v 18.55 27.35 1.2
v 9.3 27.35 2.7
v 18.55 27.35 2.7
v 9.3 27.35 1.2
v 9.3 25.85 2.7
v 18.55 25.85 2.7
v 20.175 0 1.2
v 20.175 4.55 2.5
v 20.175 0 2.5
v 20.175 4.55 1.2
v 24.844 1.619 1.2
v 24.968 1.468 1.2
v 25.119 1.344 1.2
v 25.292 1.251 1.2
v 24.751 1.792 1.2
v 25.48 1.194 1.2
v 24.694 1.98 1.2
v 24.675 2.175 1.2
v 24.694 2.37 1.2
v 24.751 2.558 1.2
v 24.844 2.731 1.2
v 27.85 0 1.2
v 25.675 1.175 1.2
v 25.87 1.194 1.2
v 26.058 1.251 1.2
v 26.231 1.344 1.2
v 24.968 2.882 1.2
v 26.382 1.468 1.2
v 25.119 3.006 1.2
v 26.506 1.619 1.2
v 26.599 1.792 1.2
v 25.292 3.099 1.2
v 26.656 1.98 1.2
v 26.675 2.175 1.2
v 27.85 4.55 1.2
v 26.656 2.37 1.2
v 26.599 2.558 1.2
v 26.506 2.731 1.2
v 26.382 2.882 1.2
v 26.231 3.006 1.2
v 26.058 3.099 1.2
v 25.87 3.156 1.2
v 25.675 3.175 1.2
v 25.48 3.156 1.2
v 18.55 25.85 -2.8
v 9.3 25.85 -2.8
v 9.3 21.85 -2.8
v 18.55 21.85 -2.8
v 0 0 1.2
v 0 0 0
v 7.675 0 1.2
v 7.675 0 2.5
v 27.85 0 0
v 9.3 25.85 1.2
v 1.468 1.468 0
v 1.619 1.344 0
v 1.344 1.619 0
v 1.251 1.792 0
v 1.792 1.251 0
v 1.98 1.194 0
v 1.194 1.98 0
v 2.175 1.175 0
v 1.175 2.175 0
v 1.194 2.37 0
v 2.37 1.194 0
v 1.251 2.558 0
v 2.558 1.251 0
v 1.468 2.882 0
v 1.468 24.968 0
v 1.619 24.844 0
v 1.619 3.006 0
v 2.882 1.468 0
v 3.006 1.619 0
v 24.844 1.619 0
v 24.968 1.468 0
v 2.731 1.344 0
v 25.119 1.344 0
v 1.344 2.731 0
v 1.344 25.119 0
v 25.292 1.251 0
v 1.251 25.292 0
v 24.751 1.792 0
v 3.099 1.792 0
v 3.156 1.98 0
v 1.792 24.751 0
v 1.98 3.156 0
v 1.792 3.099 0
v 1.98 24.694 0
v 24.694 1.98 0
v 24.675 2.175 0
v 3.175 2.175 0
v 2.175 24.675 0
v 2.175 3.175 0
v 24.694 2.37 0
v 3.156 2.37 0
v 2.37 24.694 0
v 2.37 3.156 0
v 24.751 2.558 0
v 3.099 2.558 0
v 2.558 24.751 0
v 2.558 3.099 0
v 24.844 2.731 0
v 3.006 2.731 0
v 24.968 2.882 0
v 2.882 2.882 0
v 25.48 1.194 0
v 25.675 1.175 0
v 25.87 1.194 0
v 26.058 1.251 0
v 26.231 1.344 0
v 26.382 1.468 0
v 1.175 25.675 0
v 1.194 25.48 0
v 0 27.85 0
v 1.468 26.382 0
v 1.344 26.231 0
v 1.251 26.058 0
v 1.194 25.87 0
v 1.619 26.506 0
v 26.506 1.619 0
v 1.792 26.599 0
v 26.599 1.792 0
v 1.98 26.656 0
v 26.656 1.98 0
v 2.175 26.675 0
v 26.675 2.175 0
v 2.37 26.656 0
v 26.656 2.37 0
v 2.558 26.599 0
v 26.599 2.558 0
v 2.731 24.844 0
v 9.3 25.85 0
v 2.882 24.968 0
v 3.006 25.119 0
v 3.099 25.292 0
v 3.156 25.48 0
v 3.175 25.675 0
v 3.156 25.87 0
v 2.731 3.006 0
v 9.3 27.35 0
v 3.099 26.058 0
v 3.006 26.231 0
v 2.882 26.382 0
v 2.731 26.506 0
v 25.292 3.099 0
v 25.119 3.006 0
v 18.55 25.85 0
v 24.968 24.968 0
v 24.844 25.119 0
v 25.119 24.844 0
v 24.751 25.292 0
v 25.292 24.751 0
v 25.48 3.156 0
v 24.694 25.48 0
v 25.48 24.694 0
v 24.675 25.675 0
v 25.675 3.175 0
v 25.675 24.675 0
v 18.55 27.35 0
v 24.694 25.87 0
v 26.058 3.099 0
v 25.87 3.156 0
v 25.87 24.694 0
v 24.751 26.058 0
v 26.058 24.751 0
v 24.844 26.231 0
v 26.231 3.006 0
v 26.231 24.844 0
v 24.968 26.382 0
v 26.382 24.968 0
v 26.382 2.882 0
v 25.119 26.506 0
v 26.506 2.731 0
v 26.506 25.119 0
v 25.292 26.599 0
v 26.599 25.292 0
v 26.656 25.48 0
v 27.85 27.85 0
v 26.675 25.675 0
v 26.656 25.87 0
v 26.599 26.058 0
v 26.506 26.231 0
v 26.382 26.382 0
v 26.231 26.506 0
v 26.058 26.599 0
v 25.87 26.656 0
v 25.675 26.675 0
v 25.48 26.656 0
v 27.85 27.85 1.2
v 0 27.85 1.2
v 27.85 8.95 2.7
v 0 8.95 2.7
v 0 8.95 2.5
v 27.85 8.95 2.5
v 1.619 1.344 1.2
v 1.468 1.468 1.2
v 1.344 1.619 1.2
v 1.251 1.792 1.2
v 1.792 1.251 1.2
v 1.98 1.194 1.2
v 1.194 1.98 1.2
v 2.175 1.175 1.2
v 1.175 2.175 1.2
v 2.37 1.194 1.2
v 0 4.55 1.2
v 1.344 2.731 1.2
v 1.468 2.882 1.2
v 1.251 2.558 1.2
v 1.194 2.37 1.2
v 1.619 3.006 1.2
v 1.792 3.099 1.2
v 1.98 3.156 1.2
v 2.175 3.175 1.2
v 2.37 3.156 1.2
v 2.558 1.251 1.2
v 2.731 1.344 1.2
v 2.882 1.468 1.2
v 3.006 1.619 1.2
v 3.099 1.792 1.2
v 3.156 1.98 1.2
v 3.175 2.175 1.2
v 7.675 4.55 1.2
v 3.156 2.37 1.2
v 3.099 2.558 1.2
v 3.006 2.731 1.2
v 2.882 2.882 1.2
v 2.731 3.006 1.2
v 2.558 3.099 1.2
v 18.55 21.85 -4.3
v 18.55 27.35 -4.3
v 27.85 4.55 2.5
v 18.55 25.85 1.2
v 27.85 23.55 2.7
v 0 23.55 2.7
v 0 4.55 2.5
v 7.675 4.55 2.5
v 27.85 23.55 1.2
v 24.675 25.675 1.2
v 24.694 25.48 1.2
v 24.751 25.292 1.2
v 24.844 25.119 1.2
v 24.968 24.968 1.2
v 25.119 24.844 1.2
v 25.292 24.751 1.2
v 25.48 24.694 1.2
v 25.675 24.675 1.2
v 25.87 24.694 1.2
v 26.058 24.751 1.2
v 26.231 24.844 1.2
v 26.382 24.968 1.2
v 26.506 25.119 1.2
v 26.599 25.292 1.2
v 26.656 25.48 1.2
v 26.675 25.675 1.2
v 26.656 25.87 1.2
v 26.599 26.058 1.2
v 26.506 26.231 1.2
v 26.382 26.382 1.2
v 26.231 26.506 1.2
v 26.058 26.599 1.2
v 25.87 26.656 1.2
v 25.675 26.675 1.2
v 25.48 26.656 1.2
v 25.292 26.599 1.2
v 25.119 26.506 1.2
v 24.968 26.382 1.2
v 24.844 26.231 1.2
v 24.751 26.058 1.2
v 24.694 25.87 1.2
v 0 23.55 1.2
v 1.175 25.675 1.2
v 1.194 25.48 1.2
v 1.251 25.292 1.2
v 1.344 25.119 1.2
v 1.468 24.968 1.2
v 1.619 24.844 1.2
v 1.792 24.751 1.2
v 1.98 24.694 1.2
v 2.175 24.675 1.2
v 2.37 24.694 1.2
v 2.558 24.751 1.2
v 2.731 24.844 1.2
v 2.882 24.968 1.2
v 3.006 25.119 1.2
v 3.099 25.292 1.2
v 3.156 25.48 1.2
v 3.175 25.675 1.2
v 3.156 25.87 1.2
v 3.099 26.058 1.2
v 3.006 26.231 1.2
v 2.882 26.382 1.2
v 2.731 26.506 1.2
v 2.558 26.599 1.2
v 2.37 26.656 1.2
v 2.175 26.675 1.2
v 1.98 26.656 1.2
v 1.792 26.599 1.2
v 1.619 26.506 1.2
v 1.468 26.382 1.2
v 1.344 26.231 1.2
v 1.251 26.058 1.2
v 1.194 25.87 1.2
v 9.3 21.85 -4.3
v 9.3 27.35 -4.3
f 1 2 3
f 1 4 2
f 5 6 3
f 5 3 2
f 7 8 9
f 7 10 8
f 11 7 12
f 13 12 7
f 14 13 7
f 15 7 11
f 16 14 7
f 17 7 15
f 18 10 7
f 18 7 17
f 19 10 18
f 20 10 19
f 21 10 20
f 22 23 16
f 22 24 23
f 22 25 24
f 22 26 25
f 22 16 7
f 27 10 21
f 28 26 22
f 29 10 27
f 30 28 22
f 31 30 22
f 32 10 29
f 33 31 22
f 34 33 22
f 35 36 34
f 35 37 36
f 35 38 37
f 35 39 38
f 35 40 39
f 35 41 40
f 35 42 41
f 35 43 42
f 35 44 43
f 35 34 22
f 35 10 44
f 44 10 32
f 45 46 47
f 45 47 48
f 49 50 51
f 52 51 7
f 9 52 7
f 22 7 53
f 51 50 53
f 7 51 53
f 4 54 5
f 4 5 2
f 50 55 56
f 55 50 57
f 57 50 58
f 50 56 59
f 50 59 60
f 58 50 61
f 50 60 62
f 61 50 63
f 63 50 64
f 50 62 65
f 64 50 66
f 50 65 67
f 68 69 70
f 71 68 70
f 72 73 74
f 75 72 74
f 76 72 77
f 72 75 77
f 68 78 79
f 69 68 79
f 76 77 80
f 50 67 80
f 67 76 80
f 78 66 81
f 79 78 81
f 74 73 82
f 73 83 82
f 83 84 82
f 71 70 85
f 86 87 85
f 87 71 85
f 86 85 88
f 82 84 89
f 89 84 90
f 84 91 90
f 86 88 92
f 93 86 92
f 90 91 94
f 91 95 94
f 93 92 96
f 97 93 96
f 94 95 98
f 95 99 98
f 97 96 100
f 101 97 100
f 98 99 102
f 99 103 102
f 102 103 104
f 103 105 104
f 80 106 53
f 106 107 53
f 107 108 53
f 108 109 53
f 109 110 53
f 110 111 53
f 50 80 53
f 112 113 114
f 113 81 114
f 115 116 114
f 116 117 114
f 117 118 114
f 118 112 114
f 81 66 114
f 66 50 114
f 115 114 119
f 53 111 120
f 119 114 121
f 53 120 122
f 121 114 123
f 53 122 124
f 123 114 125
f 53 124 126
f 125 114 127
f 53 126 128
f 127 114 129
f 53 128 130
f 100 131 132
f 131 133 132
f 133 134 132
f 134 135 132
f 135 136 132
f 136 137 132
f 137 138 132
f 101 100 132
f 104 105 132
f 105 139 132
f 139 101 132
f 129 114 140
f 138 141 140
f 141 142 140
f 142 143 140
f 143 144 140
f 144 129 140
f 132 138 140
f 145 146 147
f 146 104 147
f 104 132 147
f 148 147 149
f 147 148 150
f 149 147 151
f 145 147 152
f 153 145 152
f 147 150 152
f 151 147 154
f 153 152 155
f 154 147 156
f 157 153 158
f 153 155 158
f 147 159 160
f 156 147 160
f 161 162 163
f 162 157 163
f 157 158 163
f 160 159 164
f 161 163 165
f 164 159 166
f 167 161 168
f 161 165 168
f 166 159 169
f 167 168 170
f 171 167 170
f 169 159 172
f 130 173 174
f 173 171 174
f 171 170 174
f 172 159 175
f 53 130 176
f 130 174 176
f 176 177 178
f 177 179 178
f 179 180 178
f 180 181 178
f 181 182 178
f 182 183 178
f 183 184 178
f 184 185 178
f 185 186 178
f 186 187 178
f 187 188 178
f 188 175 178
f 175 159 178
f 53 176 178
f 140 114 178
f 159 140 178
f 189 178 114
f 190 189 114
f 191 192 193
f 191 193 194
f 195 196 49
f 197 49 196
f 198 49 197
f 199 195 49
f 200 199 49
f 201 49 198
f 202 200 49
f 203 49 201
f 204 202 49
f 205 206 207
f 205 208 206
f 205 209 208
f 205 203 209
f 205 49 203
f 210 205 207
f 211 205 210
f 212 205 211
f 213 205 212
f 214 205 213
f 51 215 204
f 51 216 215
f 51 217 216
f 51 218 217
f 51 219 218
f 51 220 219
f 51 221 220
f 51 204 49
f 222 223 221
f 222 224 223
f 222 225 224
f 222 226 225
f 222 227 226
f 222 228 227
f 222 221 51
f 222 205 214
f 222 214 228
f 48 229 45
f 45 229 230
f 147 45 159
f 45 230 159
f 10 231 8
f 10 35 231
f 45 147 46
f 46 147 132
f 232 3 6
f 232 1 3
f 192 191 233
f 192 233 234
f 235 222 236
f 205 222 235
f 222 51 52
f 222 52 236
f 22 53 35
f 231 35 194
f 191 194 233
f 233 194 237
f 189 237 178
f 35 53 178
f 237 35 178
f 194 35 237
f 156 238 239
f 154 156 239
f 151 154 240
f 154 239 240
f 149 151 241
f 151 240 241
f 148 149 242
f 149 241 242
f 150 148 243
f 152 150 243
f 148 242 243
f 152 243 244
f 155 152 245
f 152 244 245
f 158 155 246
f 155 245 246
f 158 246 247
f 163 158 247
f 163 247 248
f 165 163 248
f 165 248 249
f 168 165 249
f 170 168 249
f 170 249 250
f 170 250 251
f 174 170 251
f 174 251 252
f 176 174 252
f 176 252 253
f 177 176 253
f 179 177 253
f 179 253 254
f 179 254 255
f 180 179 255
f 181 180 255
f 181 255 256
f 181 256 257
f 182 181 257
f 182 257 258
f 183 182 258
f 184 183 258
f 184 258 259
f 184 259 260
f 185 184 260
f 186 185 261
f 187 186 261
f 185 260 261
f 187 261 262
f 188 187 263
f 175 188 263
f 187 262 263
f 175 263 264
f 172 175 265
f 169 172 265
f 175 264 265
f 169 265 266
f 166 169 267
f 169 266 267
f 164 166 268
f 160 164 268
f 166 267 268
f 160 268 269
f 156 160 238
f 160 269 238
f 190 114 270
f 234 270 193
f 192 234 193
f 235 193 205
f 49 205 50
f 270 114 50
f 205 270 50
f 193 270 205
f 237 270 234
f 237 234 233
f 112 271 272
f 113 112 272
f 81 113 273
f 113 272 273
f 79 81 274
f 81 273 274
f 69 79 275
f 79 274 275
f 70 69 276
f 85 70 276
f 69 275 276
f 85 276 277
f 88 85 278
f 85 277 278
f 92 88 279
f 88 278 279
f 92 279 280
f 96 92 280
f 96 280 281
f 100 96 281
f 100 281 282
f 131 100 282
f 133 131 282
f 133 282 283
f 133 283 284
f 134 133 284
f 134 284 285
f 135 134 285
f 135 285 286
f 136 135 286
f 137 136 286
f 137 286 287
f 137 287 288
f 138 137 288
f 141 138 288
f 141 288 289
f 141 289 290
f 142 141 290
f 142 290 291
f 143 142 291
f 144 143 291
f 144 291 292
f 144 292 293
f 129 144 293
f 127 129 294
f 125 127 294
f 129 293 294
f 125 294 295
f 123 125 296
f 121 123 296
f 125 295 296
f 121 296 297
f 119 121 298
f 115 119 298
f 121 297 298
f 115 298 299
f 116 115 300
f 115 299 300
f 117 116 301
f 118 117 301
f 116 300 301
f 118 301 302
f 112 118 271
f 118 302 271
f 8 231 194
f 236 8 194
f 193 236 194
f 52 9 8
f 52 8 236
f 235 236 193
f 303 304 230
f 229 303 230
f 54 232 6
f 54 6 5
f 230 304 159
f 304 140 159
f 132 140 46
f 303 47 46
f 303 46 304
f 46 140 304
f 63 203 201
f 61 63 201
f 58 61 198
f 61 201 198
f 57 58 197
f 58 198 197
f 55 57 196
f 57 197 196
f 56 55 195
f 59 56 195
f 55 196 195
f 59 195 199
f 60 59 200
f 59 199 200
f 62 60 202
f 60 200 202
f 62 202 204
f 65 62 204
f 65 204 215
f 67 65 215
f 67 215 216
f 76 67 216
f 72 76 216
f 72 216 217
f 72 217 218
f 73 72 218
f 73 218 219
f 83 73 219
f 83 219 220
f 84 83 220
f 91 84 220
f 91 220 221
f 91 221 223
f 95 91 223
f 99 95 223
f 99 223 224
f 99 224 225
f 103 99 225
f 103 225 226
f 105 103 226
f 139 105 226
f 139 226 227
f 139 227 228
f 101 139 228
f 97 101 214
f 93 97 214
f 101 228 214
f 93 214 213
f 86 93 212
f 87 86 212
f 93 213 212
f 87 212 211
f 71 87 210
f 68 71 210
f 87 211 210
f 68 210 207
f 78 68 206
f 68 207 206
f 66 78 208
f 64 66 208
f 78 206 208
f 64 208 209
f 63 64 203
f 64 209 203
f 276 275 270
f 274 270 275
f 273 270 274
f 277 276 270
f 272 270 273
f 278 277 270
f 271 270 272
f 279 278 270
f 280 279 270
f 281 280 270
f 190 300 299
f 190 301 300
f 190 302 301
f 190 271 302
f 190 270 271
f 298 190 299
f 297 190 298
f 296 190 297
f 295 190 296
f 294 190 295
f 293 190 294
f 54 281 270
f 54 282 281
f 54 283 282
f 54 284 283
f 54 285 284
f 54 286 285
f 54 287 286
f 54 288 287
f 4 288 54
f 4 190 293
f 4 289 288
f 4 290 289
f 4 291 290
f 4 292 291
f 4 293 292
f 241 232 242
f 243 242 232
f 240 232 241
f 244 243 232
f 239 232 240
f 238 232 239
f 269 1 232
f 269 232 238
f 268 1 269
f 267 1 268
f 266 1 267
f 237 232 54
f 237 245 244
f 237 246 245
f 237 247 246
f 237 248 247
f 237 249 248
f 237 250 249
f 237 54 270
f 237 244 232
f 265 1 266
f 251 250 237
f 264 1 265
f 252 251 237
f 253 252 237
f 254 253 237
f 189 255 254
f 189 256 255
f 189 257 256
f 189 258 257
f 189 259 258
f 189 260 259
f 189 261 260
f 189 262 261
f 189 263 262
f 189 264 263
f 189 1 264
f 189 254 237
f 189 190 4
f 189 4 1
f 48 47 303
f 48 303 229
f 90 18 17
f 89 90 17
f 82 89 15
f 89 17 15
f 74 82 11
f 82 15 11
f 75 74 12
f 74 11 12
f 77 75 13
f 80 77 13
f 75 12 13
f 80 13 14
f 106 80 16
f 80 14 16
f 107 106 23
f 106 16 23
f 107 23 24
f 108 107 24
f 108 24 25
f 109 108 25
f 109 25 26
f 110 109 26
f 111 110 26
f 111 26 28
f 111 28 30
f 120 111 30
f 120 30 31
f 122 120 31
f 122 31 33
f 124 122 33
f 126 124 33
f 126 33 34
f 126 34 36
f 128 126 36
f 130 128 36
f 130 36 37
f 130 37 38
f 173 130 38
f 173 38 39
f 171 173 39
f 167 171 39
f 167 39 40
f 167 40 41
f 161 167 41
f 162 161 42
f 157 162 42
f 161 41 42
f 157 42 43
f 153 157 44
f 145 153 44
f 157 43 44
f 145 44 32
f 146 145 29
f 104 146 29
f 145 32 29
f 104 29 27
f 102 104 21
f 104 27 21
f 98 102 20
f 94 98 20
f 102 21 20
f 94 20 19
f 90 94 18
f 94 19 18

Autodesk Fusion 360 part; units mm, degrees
sketch "Sketch1" plane through (0, 0, 0) normal (0, 0, 1) x (1, 0, 0)
  line L0 (0, 0) -> (27.85, 0)
  line L1 (27.85, 0) -> (27.85, 27.85)
  line L2 (27.85, 27.85) -> (0, 27.85)
  line L3 (0, 27.85) -> (0, 0)
  dimension "d1" = 27.85
  dimension "d2" = 27.85
extrude "Extrude1" add sketch "Sketch1" along normal blind 1.2
sketch "Sketch2" plane through (0, 0, 1.2) normal (0, 0, 1) x (-1, 0, 0)
  line L0 (0, -27.85) -> (0, 0)
  line L1 (0, 0) -> (-27.85, 0)
  line L2 (-27.85, 0) -> (-27.85, -27.85)
  line L3 (-27.85, -27.85) -> (0, -27.85)
  circle A0 centre (-2.175, -25.675) radius 1
  circle A1 centre (-2.175, -2.175) radius 1
  circle A2 centre (-25.675, -25.675) radius 1
  circle A3 centre (-25.675, -2.175) radius 1
  line L4 (0, -24.675) -> (-27.85, -24.675) construction
  line L5 (0, -3.175) -> (-27.85, -3.175) construction
  line L6 (-24.675, 0) -> (-24.675, -27.85) construction
  line L7 (-3.175, 0) -> (-3.175, -27.85) construction
  line L8 (-24.675, -13.925) -> (-27.85, -13.925) construction
  line L9 (-3.175, -13.925) -> (0, -13.925) construction
  line L10 (-13.925, -24.675) -> (-13.925, -27.85) construction
  line L11 (-13.925, -3.175) -> (-13.925, 0) construction
  dimension "d5" = 2
  dimension "d6" = 21.5
  dimension "d7" = 21.5
extrude "Extrude2" cut sketch "Sketch2" against normal through all contours A0 | A1 | A2 | A3
sketch "Sketch3" plane through (0, 0, 1.2) normal (0, 0, 1) x (-1, 0, 0)
  circle A0 centre (-25.675, -2.175) radius 1
  circle A1 centre (-25.675, -25.675) radius 1
  circle A2 centre (-2.175, -2.175) radius 1
  circle A3 centre (-2.175, -25.675) radius 1
  line L0 (0, -27.85) -> (0, 0)
  line L1 (0, 0) -> (-27.85, 0)
  line L2 (-27.85, 0) -> (-27.85, -27.85)
  line L3 (-27.85, -27.85) -> (0, -27.85)
  line L4 (0, -23.55) -> (-27.85, -23.55)
  line L5 (-27.85, -23.55) -> (-27.85, -4.55)
  line L6 (-27.85, -4.55) -> (0, -4.55)
  line L7 (0, -4.55) -> (0, -23.55)
  line L8 (-7.675, -4.55) -> (-20.175, -4.55)
  line L9 (-20.175, -4.55) -> (-20.175, 0)
  line L10 (-20.175, 0) -> (-7.675, 0)
  line L11 (-7.675, 0) -> (-7.675, -4.55)
  line L12 (-13.925, 0) -> (-13.925, -4.55) construction
  dimension "d9" = 19
  dimension "d10" = 4.3
  dimension "d13" = 12.5
extrude "Extrude3" add sketch "Sketch3" along normal blind 1.5 contours L0 L2 L4 L5 L6 L7 L8
extrude "Extrude4" add sketch "Sketch3" along normal blind 1.3 contours L1 L6 L8 L9 L10 L11
sketch "Sketch4" plane through (0, 0, 1.2) normal (0, 0, 1) x (-1, 0, 0)
  line L0 (0, -23.55) -> (-27.85, -23.55)
  line L1 (-27.85, -23.55) -> (-27.85, -27.85)
  line L2 (-27.85, -27.85) -> (0, -27.85)
  line L3 (0, -27.85) -> (0, -23.55)
  circle A0 centre (-25.675, -25.675) radius 1
  circle A1 centre (-2.175, -25.675) radius 1
  line L4 (-9.3, -27.35) -> (-18.55, -27.35)
  line L5 (-18.55, -27.35) -> (-18.55, -25.85)
  line L6 (-18.55, -25.85) -> (-9.3, -25.85)
  line L7 (-9.3, -25.85) -> (-9.3, -27.35)
  line L8 (-13.925, -27.85) -> (-13.925, -27.35) construction
  dimension "d16" = 2
  dimension "d17" = 1.5
  dimension "d18" = 9.25
extrude "Extrude5" add sketch "Sketch4" along normal blind 1.5 contours L4 L5 L6 L7
extrude "Extrude6" add 1 faces at (15.4667, 26.35, 2.7) along direction (0, 0, -1) blind 7
sketch "Sketch5" plane through (0, 25.85, 0) normal (0, -1, 0) x (1, 0, 0)
  line L0 (18.55, 0) -> (9.3, 0)
  line L1 (9.3, 0) -> (9.3, -4.3)
  line L2 (9.3, -4.3) -> (18.55, -4.3)
  line L3 (18.55, -4.3) -> (18.55, 0)
  line L4 (9.3, -2.8) -> (18.55, -2.8)
  dimension "d23" = 1.5
extrude "Extrude7" add sketch "Sketch5" along normal blind 4 contours L1 L2 L3 L4
sketch "Sketch6" plane through (0, 0, 2.7) normal (0, 0, 1) x (-1, 0, 0)
  line L0 (0, -4.55) -> (-27.85, -4.55)
  line L1 (-27.85, -4.55) -> (-27.85, -23.55)
  line L2 (-27.85, -23.55) -> (0, -23.55)
  line L3 (0, -23.55) -> (0, -4.55)
  line L4 (0, -8.95) -> (-27.85, -8.95)
  dimension "d26" = 14.6
extrude "Extrude8" cut sketch "Sketch6" against normal up to surface (0.2 mm away) contours L0 L1 L3 L4
